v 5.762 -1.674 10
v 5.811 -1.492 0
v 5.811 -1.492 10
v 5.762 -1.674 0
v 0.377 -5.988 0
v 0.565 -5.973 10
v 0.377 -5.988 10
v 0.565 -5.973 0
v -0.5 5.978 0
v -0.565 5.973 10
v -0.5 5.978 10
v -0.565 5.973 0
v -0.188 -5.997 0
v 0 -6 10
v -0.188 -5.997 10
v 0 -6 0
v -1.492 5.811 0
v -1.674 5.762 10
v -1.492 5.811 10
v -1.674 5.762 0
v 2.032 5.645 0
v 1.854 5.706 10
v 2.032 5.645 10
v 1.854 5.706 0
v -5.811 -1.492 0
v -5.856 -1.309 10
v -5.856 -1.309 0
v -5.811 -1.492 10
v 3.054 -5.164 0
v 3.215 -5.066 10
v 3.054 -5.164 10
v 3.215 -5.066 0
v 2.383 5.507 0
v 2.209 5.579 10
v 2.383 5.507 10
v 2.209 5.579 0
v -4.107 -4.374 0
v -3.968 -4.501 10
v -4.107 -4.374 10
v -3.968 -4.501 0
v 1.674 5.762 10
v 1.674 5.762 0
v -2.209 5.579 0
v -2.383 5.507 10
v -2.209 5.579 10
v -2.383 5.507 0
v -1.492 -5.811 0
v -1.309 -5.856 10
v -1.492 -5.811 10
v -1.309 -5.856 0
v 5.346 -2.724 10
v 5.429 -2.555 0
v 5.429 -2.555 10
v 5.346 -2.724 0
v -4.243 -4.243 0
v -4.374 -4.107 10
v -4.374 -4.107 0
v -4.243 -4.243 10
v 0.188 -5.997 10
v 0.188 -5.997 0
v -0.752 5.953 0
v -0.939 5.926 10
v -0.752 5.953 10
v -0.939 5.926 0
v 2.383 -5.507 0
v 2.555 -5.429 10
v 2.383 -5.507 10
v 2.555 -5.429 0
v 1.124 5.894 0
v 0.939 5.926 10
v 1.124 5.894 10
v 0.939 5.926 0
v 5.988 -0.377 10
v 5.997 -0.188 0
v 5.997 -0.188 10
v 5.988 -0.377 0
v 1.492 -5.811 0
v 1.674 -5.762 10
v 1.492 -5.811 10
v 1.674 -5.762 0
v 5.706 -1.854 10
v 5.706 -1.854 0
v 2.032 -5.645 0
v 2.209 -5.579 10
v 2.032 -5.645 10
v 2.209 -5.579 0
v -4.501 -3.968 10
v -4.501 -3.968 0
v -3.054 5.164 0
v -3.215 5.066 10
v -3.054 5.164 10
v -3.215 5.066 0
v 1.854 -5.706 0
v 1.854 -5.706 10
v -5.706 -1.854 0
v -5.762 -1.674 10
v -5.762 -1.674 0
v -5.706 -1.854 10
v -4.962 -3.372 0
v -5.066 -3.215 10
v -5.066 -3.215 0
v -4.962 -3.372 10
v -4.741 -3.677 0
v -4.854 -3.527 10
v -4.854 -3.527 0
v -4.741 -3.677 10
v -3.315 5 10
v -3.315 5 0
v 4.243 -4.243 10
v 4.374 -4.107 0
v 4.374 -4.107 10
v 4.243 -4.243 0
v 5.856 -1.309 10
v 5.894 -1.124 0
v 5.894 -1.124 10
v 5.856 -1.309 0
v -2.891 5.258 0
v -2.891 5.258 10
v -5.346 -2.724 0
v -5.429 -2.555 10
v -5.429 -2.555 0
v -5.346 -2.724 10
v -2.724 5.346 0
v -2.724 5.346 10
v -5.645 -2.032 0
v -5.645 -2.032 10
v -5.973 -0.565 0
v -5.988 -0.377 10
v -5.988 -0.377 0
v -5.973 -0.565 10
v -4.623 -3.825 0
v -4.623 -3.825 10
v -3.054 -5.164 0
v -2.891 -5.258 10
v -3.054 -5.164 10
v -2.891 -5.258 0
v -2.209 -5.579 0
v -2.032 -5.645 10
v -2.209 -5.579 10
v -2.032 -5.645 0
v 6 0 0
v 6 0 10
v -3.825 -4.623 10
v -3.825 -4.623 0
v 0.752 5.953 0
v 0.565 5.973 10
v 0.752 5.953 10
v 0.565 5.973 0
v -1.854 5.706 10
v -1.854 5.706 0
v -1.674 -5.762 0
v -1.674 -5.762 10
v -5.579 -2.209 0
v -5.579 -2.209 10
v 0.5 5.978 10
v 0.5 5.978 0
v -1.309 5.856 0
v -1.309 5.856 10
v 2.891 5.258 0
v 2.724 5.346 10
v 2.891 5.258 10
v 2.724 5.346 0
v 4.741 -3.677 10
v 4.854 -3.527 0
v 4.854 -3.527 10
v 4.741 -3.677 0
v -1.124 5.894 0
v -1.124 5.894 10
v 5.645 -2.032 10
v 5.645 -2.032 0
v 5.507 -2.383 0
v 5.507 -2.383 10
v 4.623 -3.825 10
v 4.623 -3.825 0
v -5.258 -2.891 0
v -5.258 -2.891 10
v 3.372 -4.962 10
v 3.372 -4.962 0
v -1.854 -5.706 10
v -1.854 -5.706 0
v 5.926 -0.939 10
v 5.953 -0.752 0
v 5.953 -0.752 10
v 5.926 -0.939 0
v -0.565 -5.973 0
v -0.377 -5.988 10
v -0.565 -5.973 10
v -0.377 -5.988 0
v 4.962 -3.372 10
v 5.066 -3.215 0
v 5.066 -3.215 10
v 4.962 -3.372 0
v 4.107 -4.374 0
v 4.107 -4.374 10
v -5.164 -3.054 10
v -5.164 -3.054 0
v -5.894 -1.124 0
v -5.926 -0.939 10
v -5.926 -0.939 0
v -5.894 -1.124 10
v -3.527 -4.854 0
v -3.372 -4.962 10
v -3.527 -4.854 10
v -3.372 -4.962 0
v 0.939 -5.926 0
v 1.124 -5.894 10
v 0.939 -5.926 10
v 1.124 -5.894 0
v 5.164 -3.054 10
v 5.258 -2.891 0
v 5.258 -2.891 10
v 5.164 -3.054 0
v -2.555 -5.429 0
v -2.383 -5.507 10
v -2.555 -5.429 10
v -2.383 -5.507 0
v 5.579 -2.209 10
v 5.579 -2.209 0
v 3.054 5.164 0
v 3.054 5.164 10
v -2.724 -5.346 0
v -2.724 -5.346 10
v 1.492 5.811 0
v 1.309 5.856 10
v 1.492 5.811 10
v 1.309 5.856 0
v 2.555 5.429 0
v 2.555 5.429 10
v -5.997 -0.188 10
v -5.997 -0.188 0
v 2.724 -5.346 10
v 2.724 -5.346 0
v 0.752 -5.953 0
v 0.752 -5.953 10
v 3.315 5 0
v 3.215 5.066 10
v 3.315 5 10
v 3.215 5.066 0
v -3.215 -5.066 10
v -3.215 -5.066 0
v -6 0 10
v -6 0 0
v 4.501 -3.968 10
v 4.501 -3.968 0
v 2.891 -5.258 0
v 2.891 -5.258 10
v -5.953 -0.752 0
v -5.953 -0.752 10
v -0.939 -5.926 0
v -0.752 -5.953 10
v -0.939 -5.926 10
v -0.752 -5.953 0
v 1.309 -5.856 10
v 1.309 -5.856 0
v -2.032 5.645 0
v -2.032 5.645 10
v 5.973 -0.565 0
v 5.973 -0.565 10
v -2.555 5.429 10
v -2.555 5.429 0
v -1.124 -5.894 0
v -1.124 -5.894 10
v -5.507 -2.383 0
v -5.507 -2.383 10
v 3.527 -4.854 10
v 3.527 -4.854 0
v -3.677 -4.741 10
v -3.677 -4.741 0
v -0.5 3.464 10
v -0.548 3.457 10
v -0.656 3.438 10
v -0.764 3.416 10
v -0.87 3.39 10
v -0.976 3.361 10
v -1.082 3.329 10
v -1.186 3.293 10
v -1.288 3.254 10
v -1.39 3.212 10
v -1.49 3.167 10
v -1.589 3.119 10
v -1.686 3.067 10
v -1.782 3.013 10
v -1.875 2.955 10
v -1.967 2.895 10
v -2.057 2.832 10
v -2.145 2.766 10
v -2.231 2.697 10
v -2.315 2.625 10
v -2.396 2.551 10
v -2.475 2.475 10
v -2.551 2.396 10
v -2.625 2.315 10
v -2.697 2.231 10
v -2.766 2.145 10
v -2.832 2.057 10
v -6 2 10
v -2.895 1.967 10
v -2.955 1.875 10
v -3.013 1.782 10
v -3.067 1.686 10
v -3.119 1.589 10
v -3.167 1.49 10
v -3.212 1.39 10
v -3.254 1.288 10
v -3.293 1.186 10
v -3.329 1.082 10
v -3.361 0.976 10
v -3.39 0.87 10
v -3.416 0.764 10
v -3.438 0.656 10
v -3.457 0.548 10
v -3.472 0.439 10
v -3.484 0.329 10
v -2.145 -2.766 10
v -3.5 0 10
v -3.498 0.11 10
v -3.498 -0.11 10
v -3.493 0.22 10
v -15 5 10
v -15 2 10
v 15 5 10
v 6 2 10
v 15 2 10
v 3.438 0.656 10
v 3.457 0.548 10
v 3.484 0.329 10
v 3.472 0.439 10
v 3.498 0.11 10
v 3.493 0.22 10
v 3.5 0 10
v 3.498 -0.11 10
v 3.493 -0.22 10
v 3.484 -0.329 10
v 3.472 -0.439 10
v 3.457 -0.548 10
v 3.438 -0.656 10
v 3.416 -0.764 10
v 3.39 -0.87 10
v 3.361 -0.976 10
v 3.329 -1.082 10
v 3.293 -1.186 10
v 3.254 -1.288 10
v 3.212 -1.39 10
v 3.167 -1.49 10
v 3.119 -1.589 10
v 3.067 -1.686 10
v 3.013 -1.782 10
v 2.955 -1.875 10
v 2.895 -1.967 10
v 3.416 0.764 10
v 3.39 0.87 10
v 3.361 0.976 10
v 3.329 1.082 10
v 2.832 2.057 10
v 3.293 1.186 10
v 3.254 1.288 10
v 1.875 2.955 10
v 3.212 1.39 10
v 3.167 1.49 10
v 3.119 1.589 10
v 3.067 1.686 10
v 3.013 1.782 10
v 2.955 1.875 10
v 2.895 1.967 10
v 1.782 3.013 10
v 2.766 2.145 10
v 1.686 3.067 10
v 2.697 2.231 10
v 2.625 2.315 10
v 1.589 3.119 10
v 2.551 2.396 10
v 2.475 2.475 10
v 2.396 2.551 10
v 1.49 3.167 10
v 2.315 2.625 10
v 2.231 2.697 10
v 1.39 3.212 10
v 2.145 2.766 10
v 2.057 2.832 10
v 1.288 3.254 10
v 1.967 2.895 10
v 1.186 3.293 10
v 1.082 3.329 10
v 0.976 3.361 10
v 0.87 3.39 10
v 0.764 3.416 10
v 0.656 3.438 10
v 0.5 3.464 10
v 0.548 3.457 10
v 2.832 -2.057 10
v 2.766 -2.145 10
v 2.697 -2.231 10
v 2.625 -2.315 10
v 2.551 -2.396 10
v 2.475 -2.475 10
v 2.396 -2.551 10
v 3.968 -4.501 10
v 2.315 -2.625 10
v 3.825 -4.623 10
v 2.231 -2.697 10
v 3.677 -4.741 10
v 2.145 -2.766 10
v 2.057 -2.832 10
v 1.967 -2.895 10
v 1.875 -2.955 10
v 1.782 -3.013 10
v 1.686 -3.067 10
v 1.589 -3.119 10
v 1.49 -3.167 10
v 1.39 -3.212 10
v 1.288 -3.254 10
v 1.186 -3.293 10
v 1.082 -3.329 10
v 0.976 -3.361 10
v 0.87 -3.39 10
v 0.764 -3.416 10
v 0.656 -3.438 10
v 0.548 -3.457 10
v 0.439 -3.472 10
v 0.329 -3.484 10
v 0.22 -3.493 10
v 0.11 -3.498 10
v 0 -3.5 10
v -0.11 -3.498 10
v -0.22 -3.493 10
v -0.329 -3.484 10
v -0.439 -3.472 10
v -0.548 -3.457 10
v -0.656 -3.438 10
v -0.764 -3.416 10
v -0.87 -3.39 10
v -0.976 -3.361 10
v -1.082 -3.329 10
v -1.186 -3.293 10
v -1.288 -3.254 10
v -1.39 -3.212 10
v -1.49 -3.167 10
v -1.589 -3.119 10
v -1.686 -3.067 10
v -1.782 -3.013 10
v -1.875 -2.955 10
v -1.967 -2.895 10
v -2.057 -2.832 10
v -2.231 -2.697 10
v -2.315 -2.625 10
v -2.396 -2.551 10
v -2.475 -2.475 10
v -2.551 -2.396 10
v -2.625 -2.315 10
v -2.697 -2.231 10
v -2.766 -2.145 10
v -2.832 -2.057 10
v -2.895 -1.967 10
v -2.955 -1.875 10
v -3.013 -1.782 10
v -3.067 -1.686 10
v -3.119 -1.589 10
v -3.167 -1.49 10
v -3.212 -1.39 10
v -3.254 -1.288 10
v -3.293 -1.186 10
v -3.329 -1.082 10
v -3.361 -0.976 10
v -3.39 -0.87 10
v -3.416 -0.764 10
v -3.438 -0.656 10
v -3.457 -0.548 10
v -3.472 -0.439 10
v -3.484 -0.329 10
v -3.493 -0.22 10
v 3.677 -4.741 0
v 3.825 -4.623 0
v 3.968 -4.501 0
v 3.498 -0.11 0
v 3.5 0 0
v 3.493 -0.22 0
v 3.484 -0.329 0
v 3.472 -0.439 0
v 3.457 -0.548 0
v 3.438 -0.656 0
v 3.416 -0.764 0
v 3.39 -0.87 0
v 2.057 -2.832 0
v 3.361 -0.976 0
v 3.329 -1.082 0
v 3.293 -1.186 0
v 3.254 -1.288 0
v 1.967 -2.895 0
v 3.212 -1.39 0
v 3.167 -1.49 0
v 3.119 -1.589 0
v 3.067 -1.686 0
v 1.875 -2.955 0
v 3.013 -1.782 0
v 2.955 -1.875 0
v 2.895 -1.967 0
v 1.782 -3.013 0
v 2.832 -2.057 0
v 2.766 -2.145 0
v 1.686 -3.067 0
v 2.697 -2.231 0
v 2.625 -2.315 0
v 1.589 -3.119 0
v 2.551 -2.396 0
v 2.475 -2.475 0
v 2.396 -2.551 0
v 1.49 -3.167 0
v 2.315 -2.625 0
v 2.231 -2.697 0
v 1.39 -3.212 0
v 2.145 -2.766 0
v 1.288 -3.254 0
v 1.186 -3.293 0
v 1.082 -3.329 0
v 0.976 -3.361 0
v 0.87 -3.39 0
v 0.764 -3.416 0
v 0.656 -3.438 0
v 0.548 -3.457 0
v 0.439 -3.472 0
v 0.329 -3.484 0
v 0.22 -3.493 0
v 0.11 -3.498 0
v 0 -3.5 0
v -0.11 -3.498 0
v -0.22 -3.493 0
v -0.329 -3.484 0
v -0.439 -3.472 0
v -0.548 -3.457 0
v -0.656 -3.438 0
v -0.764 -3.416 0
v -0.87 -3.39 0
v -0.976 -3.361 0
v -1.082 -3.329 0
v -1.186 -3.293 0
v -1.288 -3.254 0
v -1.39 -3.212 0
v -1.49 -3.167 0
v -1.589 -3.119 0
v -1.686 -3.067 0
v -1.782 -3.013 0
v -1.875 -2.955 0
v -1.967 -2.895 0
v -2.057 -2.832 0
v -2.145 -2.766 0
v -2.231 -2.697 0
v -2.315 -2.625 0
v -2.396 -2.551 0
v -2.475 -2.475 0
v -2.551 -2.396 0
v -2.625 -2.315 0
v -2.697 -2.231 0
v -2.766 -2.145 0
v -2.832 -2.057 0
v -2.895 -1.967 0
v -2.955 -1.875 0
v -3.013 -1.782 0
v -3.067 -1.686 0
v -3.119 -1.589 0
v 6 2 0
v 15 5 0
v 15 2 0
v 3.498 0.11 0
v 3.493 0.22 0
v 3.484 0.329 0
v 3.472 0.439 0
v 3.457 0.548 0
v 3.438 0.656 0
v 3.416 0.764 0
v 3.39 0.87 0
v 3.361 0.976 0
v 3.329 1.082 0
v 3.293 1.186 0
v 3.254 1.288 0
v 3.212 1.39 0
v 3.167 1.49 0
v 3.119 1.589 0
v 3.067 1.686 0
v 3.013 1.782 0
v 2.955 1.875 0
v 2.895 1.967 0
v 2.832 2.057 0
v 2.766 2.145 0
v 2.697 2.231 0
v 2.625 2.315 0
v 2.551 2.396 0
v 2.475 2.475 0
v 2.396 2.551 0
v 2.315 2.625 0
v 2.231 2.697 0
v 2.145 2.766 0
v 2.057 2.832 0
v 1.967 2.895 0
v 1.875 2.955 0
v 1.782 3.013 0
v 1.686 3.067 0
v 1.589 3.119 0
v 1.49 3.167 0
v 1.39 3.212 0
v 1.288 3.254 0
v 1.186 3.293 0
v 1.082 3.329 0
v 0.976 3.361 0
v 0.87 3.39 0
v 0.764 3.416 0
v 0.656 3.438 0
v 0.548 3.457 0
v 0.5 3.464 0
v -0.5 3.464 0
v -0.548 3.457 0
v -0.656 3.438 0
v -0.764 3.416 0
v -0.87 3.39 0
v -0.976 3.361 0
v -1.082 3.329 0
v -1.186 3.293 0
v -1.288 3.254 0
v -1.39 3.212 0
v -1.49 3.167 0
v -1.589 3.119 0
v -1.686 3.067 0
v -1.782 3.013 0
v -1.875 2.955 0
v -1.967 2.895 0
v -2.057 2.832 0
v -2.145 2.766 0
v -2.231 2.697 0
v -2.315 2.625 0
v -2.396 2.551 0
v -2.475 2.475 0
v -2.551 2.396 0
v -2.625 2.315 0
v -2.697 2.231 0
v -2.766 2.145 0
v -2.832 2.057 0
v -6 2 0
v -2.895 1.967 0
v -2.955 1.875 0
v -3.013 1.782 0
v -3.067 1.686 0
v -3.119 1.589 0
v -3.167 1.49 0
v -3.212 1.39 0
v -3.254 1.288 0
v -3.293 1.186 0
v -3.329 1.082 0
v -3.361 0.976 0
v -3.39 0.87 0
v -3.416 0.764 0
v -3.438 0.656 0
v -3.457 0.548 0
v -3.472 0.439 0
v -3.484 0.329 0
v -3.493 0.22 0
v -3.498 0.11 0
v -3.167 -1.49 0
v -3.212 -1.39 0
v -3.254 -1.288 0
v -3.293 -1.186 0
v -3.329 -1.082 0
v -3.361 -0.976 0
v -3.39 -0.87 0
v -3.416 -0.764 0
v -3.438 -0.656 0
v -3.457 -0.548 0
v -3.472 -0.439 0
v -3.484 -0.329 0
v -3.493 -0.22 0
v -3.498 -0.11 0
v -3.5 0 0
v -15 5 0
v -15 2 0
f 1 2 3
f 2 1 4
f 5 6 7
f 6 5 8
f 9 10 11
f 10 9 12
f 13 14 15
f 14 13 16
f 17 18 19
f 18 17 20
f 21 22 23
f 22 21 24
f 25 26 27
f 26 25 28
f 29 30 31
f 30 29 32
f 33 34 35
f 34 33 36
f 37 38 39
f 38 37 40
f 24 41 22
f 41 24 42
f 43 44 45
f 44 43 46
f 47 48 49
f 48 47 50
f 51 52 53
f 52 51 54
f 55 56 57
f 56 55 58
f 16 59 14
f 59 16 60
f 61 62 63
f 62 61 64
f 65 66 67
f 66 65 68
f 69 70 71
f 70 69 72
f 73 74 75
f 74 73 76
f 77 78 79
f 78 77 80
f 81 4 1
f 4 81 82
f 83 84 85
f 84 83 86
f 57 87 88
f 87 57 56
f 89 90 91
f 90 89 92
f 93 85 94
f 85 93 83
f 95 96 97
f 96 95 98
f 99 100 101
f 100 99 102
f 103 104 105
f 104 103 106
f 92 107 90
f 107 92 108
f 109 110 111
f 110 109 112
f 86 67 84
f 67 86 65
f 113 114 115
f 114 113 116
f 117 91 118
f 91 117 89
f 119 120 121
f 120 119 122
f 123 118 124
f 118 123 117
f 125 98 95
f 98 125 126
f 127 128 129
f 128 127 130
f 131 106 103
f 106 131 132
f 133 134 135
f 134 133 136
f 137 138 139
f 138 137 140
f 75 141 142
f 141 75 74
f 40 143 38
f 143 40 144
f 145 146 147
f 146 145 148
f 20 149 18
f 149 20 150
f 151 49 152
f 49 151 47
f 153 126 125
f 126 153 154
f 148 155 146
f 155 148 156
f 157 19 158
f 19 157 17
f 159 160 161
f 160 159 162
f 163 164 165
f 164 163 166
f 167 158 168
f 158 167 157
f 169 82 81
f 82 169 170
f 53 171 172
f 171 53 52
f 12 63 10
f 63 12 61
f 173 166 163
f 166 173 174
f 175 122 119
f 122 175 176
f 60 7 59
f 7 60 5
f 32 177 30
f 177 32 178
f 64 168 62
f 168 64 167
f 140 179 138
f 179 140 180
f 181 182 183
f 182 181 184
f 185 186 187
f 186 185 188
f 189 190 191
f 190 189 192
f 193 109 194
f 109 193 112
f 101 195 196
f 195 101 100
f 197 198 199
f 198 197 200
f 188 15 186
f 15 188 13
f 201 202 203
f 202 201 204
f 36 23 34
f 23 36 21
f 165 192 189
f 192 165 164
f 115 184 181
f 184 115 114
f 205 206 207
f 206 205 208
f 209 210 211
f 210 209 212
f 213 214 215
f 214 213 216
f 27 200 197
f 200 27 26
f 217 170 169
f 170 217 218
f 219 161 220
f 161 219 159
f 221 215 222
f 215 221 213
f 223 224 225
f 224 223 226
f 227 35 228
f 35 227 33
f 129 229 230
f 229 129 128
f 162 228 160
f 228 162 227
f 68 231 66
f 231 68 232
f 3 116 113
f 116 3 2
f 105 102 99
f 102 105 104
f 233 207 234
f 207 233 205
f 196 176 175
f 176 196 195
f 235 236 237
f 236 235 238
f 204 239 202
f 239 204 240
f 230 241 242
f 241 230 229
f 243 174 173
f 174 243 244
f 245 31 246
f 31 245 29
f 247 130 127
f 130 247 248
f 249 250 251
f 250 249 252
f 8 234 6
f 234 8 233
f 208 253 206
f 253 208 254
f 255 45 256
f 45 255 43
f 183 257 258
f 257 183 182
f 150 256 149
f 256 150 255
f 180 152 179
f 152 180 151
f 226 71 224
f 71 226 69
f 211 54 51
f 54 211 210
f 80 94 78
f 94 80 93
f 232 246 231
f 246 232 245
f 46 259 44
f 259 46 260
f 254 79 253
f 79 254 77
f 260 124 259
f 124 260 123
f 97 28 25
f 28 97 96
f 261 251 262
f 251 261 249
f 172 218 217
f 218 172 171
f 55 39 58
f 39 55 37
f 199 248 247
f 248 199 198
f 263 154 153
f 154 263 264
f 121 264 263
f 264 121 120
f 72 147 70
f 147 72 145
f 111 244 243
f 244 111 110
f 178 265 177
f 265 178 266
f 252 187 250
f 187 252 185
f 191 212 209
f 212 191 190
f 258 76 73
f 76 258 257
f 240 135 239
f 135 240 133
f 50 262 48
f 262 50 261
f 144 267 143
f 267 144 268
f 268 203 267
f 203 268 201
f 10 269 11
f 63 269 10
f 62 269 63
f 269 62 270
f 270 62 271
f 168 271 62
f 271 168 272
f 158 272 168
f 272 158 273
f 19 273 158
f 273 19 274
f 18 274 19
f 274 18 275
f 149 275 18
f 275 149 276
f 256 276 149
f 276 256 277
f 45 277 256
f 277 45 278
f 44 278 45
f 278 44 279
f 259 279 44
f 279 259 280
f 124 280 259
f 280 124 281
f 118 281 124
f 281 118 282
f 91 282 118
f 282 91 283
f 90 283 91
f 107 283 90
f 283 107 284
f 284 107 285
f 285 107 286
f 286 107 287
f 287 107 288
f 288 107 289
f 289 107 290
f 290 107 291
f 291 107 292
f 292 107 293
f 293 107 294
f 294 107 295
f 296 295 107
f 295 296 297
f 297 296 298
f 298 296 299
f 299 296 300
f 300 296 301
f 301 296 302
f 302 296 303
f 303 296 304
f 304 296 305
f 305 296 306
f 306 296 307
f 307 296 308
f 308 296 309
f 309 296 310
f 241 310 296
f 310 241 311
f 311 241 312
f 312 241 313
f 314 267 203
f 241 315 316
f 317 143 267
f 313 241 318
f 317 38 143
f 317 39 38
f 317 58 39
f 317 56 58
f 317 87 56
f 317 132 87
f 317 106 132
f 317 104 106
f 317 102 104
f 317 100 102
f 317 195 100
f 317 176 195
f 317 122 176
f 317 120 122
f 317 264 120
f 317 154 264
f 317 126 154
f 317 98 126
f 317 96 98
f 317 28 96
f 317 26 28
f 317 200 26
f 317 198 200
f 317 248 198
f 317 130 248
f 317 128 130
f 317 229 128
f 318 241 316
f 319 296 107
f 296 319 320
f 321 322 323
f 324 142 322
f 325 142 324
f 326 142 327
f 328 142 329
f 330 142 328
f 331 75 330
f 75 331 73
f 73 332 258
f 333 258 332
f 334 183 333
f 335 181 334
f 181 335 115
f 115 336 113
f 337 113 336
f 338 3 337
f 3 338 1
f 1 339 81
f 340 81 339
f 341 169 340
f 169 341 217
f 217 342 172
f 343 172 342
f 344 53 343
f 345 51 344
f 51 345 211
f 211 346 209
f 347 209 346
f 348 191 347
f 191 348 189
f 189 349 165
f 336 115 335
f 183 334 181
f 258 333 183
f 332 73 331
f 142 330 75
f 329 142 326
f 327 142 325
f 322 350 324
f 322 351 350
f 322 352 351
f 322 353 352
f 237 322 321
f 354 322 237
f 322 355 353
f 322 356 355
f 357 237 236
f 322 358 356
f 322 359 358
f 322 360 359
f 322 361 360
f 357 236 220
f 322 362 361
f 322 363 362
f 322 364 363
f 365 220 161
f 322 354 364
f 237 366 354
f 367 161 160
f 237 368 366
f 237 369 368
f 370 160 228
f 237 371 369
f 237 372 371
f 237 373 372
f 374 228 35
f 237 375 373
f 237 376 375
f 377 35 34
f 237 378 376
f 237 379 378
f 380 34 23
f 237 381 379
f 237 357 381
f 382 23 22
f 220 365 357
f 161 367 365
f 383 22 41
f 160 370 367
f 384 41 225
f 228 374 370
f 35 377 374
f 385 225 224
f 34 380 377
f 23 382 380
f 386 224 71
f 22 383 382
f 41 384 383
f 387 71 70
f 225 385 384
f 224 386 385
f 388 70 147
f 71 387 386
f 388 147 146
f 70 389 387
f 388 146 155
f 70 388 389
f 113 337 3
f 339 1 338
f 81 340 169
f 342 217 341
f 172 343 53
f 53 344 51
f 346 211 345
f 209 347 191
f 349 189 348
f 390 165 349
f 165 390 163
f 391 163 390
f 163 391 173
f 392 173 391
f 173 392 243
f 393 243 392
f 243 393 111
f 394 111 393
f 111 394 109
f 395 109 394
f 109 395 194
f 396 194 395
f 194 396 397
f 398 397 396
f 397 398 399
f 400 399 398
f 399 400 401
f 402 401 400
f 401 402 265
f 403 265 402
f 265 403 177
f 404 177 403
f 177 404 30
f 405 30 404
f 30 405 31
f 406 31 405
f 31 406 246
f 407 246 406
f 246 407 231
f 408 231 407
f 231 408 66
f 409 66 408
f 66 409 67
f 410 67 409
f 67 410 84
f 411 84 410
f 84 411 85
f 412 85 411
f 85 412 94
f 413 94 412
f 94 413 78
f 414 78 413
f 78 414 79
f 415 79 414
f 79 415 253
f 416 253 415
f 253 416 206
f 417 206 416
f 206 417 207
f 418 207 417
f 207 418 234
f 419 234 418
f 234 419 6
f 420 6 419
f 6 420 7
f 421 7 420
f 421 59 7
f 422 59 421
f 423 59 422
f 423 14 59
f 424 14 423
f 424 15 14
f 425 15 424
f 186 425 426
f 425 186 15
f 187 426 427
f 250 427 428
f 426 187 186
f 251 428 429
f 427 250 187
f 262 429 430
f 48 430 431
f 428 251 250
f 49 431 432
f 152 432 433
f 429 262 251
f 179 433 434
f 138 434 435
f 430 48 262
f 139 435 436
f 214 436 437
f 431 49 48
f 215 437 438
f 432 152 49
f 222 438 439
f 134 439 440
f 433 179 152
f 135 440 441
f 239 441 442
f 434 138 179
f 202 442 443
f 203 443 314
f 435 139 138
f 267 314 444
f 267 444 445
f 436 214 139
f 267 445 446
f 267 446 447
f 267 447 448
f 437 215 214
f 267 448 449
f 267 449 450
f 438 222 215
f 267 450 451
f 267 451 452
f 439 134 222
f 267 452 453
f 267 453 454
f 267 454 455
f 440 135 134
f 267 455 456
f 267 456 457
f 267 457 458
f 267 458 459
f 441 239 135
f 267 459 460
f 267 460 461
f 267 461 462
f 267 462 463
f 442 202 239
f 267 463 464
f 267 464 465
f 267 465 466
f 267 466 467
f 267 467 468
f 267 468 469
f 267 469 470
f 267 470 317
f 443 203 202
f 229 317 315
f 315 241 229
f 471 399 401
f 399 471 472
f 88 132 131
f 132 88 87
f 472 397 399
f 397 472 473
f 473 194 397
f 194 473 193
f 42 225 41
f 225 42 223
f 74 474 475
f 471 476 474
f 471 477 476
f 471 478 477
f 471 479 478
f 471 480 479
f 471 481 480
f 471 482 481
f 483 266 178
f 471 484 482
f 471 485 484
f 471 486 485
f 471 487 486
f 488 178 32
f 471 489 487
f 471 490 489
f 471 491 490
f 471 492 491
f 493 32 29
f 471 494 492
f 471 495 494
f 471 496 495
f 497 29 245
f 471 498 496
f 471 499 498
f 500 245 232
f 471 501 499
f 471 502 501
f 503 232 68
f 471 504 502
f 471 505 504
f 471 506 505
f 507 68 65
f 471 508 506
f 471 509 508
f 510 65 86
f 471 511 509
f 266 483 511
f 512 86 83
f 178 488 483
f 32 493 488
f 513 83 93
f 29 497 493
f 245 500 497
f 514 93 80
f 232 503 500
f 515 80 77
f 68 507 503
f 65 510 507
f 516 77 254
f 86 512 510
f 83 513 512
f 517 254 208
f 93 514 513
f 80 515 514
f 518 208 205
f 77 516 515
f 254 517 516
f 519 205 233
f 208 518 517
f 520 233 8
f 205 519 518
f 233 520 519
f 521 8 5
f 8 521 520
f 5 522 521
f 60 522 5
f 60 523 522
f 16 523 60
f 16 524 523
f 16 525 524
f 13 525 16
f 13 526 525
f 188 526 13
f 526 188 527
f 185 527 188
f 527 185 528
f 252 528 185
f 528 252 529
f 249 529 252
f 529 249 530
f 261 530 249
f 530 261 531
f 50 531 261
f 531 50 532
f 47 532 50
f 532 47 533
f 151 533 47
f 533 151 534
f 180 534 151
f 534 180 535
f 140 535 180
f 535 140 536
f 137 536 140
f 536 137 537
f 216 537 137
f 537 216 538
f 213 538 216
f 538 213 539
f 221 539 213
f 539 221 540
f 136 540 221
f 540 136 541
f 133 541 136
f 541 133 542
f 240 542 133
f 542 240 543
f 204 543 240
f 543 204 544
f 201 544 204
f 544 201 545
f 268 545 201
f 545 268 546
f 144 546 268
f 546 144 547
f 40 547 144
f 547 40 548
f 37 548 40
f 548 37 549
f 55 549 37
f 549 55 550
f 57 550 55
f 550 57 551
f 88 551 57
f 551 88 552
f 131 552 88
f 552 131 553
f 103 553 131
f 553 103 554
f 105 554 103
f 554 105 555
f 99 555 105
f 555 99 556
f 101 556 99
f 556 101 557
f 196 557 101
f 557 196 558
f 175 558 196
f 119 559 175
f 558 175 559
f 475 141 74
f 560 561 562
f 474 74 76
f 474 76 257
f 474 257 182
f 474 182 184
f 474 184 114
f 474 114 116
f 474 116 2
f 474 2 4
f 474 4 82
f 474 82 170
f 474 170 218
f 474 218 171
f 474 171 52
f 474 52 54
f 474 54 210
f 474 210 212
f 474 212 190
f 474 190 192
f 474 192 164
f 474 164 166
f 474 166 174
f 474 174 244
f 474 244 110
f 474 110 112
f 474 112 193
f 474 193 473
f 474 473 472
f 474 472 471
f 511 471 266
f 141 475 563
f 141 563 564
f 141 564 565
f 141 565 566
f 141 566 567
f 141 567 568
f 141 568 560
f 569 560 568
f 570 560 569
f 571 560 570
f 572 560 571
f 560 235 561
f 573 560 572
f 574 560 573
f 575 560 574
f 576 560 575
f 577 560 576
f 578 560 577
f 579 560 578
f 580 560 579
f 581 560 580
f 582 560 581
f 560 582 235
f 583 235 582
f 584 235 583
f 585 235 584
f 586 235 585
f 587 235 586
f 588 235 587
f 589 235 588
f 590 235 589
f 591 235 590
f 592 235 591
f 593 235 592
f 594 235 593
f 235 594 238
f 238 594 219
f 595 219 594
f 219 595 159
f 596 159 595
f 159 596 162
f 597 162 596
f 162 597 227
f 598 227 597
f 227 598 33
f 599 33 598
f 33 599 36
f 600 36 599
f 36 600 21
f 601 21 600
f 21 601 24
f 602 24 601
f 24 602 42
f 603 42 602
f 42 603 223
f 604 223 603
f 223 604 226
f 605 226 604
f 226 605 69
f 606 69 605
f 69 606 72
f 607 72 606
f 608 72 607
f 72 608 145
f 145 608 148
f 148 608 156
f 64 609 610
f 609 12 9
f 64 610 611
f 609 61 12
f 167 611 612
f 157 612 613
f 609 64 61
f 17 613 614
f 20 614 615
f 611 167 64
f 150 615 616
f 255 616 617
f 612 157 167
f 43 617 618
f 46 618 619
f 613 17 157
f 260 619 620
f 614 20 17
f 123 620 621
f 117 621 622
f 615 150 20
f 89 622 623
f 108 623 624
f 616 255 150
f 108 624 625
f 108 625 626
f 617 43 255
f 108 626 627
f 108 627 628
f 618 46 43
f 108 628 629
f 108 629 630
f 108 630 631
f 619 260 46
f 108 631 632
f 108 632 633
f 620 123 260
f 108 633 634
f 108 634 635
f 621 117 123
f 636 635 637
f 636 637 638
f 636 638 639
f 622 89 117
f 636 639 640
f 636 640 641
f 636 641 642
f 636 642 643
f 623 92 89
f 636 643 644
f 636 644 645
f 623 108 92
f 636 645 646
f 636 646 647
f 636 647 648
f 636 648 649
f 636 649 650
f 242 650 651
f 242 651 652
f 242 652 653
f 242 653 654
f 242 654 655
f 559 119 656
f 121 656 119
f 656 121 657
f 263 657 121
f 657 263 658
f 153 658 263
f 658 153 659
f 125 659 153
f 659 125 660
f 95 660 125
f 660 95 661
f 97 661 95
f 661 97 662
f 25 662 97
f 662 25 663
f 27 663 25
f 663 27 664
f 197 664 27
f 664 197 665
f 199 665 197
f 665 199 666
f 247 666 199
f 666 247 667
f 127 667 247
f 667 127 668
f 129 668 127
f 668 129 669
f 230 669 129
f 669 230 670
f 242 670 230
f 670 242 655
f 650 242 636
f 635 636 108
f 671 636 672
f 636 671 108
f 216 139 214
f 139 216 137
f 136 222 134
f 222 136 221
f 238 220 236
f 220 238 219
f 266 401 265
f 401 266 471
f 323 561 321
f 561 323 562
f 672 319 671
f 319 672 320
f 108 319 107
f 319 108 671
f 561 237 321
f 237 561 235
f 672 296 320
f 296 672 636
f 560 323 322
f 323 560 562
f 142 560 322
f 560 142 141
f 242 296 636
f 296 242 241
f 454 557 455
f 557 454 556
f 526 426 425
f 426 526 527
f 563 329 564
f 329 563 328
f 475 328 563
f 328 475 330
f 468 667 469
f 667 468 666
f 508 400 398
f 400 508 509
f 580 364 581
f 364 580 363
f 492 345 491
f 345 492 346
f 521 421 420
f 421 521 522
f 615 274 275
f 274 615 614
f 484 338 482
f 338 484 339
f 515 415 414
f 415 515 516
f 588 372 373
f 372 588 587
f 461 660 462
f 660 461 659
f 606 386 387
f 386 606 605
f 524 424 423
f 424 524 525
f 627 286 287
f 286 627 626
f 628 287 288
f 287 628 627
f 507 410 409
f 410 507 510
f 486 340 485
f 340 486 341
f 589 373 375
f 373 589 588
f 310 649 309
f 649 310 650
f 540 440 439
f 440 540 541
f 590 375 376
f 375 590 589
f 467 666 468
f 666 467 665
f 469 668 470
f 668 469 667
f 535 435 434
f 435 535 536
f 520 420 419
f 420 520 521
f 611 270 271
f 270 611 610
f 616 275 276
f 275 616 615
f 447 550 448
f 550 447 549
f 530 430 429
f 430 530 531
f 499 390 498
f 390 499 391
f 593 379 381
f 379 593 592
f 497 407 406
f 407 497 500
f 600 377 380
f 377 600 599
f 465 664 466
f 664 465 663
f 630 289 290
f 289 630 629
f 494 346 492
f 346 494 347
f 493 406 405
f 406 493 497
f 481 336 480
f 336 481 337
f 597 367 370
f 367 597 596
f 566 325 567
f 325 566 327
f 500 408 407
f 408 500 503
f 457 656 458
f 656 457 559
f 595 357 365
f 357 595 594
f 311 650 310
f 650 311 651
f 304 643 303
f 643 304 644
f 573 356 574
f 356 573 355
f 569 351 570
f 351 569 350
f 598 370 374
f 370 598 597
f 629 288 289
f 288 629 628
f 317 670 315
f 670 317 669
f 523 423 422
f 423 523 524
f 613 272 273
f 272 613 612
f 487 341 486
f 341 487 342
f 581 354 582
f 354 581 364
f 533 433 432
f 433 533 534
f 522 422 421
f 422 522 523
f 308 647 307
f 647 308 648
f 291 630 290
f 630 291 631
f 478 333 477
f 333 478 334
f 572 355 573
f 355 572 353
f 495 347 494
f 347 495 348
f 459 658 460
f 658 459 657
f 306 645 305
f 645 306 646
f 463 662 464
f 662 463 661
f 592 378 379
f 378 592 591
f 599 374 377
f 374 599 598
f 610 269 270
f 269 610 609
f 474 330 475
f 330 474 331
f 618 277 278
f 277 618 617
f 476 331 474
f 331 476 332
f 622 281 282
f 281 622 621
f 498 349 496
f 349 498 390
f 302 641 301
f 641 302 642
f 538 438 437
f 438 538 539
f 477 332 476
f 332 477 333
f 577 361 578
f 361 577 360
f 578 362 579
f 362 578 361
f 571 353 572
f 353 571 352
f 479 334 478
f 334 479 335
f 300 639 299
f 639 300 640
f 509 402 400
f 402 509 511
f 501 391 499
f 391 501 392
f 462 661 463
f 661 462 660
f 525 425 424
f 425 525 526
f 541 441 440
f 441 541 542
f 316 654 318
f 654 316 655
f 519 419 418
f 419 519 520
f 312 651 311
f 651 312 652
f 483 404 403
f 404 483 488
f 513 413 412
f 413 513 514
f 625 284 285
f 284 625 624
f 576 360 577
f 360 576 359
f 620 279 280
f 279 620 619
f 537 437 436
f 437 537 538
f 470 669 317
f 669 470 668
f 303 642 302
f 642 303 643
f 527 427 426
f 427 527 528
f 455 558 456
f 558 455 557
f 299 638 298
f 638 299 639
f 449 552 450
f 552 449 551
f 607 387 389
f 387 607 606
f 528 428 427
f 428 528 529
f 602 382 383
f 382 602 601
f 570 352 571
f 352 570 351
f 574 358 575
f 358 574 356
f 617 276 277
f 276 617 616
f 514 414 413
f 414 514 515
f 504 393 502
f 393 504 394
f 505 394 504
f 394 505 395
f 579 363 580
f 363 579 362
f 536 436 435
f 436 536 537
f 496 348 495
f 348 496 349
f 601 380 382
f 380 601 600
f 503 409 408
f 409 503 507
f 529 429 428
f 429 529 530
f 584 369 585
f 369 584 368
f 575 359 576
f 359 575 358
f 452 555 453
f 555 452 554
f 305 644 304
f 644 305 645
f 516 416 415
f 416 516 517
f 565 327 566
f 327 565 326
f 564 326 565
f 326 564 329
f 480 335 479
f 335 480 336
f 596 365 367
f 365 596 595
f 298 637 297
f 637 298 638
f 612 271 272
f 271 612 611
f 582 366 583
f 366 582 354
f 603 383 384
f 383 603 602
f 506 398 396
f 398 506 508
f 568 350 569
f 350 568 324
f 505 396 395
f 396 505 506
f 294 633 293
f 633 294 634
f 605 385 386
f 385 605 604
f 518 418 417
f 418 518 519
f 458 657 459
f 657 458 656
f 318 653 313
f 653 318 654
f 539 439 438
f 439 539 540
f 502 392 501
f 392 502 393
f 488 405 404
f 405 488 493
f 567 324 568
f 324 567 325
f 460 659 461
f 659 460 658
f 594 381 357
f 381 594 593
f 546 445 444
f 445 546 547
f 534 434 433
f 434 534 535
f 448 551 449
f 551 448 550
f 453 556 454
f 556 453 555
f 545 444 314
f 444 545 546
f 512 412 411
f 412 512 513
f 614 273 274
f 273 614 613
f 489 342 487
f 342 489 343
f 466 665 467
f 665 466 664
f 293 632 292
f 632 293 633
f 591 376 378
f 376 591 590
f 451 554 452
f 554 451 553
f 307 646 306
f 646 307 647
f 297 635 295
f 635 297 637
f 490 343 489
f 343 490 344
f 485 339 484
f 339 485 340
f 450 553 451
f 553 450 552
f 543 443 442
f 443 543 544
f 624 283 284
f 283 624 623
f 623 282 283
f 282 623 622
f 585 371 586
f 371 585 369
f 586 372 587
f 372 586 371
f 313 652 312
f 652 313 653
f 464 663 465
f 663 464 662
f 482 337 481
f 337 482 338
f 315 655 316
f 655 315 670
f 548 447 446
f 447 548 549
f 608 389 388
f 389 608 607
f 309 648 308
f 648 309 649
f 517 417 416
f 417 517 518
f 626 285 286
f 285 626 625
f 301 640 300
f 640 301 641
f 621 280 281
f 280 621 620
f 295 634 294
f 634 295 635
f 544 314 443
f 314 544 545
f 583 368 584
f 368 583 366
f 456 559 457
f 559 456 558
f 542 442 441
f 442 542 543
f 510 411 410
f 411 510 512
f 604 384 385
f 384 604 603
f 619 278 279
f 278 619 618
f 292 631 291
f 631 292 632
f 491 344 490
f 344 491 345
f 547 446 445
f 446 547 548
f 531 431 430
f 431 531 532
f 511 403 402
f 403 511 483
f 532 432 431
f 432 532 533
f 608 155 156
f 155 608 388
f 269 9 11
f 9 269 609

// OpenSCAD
module cone(male) {
  difference(){
    cylinder(d1 = 90, d2 = 60, h = 30, $fn = 200);

    // Eje
    translate([0,0,-1]) cylinder(d = 10, h = 32, $fn = 200);
    // Rodamiento 1
    translate([0,0,-1]) cylinder(d = 22, h = 9, $fn = 200);
    // Rodamiento 2
    translate([0,0,30-8]) cylinder(d = 22, h = 9, $fn = 200);

    // Tornillos
    for (i = [0, 120, 240]) {
        rotate([0,0,i]) {
            translate([20,0,-1]) {
                cylinder(d = 12, h = 30 - 5, $fn = 200);
                cylinder(d = 4 + 0.2, h = 32, $fn = 200);
            }
        }
    } 
    if (!male) {
        // Guias
        for (i = [60, 180, 300]) {
            rotate([0,0,i]) {
                translate([20,0,-1])  cylinder(d = 10 + 0.2, h = 32, $fn = 200);
            }
        } 
    }
  }
  if (male) {
        // Guias
        for (i = [60, 180, 300]) {
            rotate([0,0,i]) {
                translate([20,0,0]) cylinder(d = 10, h = 75, $fn = 200);
                translate([20,0,75]) cylinder(d1 = 10, d2 = 6, h = 5, $fn = 200);
            }
        } 
    }
}

// cone(false);

module key() {
    difference() {
        union(){
            cylinder(d = 11, h = 40, $fn = 200);
            cube([40,11,10], center = true);
        }
        translate([0,0,40 - 3 + 0.001]) cylinder(d = 8 + 0.2, h = 3, $fn = 6);
        translate([0,0,-10]) cylinder(d = 4 + 0.5, h = 50, $fn = 200);
    }
    
}

// key();

module holder() {  
    difference(){
        union() {  
            difference(){
                    cube([40,60,40]); 
                    translate([(40-15-0.2)/2,60-40,-1]) cube([15 + 0.2,40 + 0.1,62]);
            } 
            translate([-5,(60-40)/2,40/2]) rotate([0,90,0]) cylinder(d = 20, h = 50, $fn = 200);   
        }
        translate([-6,(60-40)/2,40/2]) rotate([0,90,0]) cylinder(d = 7.8, h = 52, $fn = 200);   
        translate([40 - 5,60 - 5,40/2]) rotate([0,90,0]) cylinder(d = 8.2, h = 6, $fn = 6);  
        translate([-1,60 - 5,40/2]) rotate([0,90,0]) cylinder(d = 4.5, h = 60 + 2, $fn = 200);  
        translate([-1,60 - 5,40/2]) rotate([0,90,0]) cylinder(d1 = 30, d2 = 20, h = 6, $fn = 200);  
    }
}

// holder();

module washer() {
    difference(){
        cylinder(d = 20, h = 2, $fn = 200);
        translate([0,0,-1]) cylinder(d = 9, h = 4, $fn = 200);
    }
}

// washer();

module tube() {
  difference(){
    union() {
        cylinder(d = 50, h = 70, $fn = 200);
        cylinder(d = 120, h = 3, $fn = 200);
    }

    // Eje
    translate([0,0,-1]) cylinder(d = 10, h = 70 + 2, $fn = 200);
    // Rodamiento 1
    translate([0,0,-1]) cylinder(d = 22, h = 9, $fn = 200);
    // Rodamiento 2
    translate([0,0,70-8]) cylinder(d = 22, h = 9, $fn = 200);    
  }
}

module clip() {
    difference(){
        union() {
            cylinder(d = 12, h = 20, $fn = 200);
            cylinder(d = 120, h = 3, $fn = 200);
        }

        // Eje
        translate([0,0,-1]) cylinder(d = 8, h = 30 + 2, $fn = 200);  
    }
}

module clamp() {
    difference(){
        union() {
            cylinder(d = 12, h = 10, $fn = 200);
            translate([-15,2,0]) cube([30,3,10]);
            translate([-6,0,0]) cube([12,3,10]);
        }
        translate([0,0,-0.001]) cylinder(d = 7, h = 10 + 0.002, $fn = 200);
        translate([-0.5,1,-0.001]) cube([1,5,10 + 0.002]);
    }
}

clamp();
